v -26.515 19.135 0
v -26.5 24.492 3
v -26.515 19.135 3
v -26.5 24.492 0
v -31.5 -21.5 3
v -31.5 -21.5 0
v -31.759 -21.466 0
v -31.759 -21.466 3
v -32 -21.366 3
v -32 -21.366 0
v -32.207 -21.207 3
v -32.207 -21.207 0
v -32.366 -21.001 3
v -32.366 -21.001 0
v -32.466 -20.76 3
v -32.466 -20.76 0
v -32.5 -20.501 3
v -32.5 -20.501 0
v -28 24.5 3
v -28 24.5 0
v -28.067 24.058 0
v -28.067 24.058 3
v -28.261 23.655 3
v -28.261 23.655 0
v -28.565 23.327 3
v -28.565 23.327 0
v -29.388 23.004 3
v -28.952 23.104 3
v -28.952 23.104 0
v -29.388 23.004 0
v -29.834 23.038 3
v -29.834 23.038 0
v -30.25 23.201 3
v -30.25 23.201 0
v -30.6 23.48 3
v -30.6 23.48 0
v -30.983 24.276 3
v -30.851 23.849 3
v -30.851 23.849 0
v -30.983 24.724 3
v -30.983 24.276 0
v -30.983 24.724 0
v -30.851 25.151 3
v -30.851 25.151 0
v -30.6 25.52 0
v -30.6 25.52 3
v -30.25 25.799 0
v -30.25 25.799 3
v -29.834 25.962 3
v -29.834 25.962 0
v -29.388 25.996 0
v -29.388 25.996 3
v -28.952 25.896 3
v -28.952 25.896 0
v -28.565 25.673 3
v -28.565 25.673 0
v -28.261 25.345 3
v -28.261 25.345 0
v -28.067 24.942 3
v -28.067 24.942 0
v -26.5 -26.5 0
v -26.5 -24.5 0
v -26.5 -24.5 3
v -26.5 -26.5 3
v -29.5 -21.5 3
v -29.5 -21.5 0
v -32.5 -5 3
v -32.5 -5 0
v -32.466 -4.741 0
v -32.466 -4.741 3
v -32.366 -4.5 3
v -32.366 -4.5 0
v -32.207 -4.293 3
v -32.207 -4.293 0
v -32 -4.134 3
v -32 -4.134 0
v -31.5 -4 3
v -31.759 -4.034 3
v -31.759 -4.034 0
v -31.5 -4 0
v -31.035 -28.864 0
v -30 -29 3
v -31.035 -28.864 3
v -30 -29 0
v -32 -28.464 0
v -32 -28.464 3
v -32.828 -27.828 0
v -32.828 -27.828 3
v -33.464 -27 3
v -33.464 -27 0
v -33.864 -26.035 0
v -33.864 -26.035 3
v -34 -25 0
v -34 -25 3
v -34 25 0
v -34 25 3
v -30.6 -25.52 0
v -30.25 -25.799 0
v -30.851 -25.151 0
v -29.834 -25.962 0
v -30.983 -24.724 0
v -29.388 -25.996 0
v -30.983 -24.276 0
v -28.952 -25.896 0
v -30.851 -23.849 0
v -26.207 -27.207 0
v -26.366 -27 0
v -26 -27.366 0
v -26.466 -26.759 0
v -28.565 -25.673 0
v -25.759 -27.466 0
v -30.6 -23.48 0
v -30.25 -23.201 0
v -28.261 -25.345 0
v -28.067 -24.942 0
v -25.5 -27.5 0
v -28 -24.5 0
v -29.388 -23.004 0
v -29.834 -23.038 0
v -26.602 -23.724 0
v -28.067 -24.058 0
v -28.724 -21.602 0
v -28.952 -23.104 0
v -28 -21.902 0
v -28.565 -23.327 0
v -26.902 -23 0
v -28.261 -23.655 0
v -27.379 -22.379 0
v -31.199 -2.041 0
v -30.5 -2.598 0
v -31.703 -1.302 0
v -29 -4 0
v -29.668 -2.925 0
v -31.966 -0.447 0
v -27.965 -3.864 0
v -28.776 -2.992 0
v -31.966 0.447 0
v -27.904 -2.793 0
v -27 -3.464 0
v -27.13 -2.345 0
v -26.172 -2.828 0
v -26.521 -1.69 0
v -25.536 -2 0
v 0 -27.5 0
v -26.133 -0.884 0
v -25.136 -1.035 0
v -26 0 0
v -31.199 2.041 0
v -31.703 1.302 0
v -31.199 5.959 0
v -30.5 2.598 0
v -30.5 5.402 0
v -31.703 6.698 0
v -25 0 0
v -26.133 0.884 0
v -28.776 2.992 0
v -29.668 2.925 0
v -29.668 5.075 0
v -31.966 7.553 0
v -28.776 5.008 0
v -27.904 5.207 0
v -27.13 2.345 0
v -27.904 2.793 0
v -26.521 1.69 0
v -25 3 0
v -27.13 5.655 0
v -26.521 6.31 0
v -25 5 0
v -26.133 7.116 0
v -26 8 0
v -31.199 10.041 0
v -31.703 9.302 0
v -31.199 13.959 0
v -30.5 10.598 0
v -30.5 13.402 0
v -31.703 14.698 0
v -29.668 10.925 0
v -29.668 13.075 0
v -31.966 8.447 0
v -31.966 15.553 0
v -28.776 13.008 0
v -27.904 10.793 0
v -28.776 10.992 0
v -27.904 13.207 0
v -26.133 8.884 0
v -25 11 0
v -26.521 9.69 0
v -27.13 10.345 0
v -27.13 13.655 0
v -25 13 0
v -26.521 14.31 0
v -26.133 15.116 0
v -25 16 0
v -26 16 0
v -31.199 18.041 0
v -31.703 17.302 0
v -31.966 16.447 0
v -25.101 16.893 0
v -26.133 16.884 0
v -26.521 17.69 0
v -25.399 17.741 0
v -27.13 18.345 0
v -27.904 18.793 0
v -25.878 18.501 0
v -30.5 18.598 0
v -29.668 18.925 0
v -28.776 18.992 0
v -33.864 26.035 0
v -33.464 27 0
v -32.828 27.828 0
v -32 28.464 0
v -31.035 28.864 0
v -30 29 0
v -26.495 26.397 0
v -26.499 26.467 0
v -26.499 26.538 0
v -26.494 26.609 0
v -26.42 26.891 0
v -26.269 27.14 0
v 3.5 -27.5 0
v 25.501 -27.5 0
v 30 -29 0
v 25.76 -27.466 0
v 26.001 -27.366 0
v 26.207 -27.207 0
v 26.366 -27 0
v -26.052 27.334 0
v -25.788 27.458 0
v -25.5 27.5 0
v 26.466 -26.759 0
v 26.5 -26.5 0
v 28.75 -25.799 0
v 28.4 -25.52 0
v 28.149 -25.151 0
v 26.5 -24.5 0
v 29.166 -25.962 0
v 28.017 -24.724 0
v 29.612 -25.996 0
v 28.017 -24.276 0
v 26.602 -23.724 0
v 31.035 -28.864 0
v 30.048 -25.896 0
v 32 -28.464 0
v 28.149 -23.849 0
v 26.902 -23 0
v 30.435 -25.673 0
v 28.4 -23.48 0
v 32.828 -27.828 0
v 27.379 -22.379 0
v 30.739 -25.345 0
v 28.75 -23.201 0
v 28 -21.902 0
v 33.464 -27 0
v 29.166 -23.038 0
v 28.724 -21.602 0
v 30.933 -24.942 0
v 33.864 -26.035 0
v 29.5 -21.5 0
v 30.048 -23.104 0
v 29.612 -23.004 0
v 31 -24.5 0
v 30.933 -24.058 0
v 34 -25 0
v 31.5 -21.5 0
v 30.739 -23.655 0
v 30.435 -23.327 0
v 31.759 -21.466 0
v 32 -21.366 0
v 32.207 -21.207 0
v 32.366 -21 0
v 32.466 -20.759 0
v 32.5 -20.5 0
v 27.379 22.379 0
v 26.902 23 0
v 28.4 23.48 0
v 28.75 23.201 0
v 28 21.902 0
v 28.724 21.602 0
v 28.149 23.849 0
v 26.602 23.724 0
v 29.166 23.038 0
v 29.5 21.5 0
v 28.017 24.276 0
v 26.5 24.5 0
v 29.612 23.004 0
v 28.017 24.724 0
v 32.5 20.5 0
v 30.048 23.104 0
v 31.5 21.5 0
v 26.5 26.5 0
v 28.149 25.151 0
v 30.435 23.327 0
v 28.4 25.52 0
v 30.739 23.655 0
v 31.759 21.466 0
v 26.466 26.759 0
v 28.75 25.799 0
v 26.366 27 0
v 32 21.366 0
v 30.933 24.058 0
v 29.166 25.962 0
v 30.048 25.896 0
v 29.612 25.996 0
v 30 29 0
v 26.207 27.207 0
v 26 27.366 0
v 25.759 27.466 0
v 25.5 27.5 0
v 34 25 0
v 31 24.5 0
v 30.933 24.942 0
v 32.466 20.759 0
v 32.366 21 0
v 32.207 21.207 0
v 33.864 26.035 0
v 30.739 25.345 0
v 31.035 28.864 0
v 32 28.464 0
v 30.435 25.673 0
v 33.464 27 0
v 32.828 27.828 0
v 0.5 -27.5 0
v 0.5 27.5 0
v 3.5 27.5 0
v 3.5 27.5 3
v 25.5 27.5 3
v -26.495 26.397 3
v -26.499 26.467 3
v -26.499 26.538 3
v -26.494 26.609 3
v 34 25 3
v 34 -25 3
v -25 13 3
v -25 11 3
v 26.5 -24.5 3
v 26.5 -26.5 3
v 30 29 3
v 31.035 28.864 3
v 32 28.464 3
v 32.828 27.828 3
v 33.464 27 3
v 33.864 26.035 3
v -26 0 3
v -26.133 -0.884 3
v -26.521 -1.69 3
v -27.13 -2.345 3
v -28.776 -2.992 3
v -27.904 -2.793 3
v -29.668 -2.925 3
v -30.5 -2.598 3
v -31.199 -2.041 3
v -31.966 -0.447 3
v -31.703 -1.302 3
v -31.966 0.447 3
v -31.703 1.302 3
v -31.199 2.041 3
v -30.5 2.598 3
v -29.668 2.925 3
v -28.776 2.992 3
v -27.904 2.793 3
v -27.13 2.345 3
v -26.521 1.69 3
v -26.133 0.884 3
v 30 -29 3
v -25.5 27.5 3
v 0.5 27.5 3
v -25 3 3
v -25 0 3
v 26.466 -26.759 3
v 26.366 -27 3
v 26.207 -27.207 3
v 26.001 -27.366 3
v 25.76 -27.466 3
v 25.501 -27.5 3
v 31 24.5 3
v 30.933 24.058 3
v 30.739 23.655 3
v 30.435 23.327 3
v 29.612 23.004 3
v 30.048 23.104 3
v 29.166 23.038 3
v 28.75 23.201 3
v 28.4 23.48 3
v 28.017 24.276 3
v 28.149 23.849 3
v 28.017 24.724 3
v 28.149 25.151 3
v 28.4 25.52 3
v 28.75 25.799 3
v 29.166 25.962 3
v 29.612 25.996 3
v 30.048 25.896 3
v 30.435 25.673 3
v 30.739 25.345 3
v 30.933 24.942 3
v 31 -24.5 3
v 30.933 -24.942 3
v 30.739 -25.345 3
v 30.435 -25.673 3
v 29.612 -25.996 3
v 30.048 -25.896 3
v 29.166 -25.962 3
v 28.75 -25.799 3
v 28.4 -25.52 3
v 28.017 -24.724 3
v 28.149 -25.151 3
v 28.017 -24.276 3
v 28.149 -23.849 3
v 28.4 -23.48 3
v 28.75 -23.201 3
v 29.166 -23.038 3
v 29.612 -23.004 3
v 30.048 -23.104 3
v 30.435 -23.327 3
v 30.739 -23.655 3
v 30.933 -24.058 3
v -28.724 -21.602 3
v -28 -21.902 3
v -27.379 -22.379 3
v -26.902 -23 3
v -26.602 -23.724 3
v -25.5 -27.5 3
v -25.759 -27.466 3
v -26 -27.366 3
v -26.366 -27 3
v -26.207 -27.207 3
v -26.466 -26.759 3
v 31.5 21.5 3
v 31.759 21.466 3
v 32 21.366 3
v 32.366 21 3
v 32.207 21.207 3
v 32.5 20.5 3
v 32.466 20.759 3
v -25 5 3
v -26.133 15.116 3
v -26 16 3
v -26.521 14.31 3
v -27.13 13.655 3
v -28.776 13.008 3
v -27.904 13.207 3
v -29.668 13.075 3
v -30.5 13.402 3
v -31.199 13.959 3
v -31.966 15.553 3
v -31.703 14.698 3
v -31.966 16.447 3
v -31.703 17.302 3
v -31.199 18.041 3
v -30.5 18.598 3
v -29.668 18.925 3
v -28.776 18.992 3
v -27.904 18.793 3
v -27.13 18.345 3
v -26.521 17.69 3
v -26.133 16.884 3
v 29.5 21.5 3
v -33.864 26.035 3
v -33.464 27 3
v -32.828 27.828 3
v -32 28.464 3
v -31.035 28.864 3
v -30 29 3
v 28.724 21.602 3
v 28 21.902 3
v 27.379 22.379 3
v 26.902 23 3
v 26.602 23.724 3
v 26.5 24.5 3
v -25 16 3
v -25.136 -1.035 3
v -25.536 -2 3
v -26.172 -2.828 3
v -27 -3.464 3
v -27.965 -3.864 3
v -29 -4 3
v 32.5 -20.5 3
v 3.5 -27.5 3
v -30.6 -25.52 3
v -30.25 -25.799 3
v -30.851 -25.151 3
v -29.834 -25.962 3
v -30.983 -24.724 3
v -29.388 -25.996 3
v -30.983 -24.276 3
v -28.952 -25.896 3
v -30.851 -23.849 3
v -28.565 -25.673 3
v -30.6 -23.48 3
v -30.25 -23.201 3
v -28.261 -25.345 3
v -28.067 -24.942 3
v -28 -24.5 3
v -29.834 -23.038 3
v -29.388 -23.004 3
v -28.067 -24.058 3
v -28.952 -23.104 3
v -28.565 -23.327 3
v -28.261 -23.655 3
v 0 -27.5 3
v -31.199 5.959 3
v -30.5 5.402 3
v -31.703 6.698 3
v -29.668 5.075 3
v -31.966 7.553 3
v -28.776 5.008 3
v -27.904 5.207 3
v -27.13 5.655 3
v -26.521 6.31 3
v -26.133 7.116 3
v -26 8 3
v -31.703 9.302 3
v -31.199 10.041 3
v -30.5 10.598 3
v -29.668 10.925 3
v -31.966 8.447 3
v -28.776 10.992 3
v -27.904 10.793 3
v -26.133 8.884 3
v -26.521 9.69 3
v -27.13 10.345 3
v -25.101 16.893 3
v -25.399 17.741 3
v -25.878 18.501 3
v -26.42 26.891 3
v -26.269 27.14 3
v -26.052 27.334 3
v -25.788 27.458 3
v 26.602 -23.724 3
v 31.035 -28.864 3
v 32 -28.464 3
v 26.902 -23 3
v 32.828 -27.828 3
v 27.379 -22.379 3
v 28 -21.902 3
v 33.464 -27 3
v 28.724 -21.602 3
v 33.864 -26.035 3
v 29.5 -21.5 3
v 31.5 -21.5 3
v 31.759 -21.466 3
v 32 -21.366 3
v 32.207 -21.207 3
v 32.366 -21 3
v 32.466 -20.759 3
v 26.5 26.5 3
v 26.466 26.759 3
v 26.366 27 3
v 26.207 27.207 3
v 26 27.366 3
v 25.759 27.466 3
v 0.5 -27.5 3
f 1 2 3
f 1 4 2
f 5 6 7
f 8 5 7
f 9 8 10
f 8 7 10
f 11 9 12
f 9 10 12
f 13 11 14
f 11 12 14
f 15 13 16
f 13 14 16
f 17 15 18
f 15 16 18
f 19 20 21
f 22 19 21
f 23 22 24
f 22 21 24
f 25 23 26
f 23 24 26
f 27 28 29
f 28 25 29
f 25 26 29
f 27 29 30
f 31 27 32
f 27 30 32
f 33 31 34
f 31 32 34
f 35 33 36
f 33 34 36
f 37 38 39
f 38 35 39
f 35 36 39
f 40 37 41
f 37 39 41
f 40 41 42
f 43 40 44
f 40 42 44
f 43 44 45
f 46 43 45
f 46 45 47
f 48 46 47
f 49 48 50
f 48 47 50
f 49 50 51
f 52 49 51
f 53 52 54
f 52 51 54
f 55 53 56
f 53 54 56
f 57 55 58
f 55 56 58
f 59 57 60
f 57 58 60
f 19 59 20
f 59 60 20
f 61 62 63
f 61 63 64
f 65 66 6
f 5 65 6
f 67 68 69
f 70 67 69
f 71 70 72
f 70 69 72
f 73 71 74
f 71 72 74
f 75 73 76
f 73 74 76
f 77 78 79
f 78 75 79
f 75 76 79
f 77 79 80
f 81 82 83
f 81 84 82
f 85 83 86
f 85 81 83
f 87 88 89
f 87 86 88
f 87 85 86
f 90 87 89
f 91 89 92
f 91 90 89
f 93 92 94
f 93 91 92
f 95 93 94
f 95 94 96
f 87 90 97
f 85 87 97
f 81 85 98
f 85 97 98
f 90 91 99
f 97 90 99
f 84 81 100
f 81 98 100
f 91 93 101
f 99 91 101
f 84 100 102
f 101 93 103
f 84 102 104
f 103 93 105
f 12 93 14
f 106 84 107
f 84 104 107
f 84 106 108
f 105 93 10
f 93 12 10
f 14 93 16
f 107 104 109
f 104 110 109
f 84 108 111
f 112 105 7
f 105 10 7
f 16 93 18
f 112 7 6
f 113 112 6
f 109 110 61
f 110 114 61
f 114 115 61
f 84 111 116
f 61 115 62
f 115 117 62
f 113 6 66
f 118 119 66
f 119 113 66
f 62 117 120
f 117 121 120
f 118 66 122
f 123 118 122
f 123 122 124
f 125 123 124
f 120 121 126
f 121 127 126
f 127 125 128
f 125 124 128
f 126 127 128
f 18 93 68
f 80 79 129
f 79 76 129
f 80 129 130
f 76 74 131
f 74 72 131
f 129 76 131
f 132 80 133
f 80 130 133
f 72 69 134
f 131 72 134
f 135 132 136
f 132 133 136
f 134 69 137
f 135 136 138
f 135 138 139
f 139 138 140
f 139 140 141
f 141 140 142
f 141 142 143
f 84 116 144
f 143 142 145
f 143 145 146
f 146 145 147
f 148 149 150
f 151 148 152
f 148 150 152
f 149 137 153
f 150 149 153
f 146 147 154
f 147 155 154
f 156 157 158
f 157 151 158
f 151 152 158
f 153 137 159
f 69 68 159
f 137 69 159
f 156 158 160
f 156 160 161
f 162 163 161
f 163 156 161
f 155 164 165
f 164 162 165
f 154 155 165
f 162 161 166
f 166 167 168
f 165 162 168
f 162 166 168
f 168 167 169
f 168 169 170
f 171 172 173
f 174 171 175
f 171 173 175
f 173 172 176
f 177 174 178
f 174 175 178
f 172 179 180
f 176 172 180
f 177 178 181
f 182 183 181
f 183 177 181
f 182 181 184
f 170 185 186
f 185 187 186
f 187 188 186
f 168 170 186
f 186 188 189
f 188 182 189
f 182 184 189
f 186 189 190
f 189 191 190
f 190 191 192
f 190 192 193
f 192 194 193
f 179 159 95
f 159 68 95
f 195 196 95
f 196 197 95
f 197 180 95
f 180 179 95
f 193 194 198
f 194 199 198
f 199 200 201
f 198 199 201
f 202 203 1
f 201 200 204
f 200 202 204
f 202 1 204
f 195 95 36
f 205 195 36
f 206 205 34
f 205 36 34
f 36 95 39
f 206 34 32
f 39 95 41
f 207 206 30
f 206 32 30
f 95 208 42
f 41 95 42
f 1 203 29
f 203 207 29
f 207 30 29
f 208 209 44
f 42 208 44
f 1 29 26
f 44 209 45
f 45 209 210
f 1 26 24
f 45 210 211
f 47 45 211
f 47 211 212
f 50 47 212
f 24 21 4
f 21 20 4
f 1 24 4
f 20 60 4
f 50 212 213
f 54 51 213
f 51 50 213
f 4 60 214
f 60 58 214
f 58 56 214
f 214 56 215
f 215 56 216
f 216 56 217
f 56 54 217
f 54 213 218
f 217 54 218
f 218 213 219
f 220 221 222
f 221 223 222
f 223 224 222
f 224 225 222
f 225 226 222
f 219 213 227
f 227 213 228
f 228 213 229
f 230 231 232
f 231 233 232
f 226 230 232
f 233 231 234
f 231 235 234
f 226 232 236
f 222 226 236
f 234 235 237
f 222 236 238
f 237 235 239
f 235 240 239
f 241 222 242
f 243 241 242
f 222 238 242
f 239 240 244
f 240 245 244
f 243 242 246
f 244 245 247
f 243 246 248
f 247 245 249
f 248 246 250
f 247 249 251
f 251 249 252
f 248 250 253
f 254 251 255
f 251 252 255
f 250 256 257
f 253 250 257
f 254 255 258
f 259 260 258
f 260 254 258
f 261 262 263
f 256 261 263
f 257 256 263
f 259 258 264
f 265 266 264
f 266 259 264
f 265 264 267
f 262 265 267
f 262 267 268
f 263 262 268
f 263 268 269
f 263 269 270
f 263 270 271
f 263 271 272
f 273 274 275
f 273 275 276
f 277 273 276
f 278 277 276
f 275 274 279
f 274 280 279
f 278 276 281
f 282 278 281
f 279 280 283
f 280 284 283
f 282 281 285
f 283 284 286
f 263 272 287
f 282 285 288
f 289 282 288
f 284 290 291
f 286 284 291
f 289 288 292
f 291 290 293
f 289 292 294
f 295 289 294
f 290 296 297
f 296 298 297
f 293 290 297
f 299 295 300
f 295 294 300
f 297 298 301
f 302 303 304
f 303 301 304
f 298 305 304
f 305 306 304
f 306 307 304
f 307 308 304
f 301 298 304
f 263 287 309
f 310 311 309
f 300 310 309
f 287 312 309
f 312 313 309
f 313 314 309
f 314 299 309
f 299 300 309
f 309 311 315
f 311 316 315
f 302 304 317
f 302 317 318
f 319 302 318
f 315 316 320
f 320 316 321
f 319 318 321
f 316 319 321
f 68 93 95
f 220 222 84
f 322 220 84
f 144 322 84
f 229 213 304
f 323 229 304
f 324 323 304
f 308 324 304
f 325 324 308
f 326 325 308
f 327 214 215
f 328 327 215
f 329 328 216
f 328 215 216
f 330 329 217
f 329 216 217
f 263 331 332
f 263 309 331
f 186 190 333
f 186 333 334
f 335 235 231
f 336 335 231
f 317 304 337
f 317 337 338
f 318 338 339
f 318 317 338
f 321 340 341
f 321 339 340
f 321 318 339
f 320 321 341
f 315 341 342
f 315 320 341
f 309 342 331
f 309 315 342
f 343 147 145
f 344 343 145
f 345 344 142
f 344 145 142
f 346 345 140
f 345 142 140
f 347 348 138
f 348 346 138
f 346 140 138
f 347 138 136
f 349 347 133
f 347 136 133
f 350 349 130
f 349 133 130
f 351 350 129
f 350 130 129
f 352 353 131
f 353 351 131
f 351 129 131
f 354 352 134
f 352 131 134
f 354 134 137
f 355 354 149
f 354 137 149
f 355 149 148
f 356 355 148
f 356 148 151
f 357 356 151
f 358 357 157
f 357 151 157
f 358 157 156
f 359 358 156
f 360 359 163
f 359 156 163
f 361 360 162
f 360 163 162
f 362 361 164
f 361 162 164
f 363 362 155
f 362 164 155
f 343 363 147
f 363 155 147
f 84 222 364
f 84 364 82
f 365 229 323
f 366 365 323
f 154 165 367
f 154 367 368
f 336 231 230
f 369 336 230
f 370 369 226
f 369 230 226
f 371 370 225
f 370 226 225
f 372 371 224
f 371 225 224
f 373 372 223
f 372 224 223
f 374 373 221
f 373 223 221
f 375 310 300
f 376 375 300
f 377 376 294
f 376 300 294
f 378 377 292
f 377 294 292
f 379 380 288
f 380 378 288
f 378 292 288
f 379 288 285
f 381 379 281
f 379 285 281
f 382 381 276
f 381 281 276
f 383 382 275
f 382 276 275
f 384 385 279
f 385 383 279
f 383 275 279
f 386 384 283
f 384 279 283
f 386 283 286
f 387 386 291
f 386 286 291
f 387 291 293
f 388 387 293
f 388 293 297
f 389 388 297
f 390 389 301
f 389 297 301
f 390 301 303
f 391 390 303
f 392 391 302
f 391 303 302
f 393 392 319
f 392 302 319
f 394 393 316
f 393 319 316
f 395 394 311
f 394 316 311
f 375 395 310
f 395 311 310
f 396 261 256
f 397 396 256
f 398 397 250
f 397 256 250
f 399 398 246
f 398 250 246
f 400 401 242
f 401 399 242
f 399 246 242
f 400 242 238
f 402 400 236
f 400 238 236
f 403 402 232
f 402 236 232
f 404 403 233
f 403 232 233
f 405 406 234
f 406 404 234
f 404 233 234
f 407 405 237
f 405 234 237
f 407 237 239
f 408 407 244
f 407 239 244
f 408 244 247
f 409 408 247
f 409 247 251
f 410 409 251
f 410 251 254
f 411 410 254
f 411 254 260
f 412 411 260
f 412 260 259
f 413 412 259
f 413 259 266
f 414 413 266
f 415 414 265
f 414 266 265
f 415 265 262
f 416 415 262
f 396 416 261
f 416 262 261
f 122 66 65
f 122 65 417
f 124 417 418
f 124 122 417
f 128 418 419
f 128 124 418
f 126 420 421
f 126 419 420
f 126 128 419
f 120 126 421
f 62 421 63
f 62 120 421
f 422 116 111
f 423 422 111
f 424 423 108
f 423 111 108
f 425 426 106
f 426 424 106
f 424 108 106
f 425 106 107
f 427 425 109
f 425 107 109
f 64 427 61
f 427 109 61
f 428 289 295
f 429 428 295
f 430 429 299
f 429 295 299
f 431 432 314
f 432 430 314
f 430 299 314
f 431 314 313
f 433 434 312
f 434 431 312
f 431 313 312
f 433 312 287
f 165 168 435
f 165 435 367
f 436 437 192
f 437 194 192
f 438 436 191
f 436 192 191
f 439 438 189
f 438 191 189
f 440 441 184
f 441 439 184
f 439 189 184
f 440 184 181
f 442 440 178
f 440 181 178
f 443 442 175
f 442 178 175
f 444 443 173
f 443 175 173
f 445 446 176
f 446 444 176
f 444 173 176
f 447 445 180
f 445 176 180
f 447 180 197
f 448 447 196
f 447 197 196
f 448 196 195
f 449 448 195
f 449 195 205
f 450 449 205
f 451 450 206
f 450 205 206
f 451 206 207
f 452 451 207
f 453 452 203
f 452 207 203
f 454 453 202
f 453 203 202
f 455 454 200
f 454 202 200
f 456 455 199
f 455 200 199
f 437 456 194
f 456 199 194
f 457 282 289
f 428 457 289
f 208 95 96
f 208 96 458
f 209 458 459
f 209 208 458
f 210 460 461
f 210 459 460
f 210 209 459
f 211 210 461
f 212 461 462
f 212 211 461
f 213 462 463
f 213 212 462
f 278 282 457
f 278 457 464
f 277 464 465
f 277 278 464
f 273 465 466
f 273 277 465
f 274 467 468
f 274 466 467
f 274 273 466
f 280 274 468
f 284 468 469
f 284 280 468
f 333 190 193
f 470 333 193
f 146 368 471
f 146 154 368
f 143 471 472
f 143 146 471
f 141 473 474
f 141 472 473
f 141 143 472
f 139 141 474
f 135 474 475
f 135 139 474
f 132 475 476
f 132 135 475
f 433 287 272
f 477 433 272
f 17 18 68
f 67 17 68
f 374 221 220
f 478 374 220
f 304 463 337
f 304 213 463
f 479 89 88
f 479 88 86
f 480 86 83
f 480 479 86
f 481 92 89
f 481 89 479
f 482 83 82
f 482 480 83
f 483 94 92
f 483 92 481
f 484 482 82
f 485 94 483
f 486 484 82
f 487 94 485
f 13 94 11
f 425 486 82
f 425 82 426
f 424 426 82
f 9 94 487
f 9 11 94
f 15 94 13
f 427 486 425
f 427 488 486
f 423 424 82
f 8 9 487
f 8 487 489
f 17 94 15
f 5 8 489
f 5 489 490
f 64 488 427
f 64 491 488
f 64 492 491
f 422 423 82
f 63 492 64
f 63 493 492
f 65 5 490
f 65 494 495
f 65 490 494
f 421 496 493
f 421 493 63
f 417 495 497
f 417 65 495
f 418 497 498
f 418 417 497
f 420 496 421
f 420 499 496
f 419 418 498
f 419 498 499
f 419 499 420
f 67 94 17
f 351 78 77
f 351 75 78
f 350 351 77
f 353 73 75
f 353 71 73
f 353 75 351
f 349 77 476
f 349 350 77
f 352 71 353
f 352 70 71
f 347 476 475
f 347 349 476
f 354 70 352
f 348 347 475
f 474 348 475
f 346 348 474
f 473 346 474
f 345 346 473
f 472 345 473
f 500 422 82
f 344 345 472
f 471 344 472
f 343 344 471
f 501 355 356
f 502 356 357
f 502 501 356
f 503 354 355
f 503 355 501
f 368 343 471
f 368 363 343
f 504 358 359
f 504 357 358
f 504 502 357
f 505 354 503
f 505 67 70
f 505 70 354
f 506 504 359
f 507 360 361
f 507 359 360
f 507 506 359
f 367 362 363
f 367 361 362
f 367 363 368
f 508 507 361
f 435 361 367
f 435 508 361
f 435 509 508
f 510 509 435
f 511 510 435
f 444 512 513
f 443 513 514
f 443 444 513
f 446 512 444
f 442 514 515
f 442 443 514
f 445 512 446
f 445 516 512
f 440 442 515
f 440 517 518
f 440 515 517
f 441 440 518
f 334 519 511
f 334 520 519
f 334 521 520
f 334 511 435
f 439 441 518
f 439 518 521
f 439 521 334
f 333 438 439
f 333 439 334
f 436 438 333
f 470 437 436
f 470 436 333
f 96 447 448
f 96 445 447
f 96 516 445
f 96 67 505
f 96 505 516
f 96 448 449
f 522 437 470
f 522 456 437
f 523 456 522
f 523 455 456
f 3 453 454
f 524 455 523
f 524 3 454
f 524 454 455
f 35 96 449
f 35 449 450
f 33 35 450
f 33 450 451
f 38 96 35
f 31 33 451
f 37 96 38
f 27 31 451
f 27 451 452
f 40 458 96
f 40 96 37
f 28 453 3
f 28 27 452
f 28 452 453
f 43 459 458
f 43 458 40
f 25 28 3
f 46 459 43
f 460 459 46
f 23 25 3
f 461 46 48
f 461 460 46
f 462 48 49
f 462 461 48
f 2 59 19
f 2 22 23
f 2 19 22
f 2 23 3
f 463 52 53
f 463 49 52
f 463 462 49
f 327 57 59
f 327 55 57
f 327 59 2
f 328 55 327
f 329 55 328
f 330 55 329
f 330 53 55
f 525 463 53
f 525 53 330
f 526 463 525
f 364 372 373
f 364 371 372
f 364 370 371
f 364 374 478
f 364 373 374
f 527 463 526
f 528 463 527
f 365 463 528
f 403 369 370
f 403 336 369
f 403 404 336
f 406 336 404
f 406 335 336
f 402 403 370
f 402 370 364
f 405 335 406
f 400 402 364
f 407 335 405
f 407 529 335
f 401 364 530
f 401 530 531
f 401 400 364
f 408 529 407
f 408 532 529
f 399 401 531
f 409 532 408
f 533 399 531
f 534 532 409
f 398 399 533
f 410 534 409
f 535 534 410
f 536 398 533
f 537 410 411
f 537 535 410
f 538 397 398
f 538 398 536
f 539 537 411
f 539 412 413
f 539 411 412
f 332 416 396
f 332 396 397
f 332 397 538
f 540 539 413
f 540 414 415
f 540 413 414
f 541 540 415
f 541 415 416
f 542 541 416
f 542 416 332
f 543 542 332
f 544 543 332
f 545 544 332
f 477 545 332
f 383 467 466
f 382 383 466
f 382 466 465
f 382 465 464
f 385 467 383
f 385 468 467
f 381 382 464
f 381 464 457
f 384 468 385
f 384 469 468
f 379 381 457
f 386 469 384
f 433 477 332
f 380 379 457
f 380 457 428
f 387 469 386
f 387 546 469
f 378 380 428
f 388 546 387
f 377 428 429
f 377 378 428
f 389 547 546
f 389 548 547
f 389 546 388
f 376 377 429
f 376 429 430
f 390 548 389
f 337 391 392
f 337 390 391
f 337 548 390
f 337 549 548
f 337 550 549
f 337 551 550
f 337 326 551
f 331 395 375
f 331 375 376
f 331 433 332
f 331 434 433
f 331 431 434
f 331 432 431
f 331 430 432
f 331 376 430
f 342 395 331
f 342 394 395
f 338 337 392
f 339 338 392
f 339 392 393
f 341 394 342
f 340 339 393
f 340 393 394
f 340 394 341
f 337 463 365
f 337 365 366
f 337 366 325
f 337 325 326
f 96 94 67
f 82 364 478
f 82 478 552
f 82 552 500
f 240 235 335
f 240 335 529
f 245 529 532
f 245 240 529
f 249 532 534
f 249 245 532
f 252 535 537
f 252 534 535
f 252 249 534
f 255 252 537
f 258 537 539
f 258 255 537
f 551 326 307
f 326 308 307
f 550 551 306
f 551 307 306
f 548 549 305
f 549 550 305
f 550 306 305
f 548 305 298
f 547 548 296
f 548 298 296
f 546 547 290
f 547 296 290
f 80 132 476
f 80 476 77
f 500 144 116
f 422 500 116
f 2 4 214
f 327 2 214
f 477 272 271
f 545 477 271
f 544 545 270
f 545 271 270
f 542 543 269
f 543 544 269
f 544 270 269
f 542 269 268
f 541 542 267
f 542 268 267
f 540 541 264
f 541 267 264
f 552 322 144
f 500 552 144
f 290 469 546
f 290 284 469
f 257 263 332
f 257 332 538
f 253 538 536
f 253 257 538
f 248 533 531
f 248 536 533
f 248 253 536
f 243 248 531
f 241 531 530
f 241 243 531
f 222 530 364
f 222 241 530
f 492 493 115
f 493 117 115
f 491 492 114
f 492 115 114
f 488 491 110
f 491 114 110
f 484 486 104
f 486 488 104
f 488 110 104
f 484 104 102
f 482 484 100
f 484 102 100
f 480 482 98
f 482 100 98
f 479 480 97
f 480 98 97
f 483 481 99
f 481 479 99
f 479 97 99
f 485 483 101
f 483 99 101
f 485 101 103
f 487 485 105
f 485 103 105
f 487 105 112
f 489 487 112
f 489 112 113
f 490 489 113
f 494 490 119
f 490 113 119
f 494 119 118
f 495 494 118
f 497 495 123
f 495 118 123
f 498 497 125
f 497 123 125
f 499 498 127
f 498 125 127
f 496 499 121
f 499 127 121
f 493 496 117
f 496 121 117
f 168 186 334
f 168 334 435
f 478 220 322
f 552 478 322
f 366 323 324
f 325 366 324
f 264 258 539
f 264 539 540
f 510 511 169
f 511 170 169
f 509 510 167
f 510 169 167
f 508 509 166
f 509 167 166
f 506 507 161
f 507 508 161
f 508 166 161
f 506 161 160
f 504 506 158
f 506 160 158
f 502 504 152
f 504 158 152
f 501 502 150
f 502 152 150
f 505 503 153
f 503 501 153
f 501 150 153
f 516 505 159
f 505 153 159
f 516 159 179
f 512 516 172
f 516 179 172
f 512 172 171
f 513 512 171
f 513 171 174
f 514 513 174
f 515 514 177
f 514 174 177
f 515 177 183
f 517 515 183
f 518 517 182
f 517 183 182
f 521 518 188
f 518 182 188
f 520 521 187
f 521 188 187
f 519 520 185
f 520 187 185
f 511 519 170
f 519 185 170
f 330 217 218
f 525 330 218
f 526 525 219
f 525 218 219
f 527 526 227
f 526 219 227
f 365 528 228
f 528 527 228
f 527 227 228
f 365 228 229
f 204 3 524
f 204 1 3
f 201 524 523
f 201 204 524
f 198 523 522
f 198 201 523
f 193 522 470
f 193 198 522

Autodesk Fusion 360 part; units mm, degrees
sketch "Sketch1" plane through (0, 0, 0) normal (0, 0, 1) x (1, 0, 0)
  line L0 (-29.5, 24.5) -> (-35.5, 24.5) construction
  circle A0 centre (29.5, 24.5) radius 1.5
  line L1 (25.5009, -27.5) -> (3.5, -27.5)
  arc A1 (34, 25) -> (30, 29) centre (30, 25) ccw
  circle A2 centre (29.5, -24.5) radius 1.5
  arc A3 (30, -29) -> (34, -25) centre (30, -25) ccw
  line L2 (30, -29) -> (-30, -29)
  arc A4 (-34, -25) -> (-30, -29) centre (-30, -25) ccw
  line L3 (0, -27.5) -> (0.5, -27.5) construction
  line L4 (0.5, -27.5) -> (-25.5, -27.5)
  line L5 (-30, 29) -> (30, 29)
  line L6 (0, 27.5) -> (0.5, 27.5) construction
  circle A5 centre (-29.5, 24.5) radius 1.5
  arc A6 (-30, 29) -> (-34, 25) centre (-30, 25) ccw
  line L7 (0, -27.5) -> (0.5, -27.5) construction
  line L8 (-34, -25) -> (-34, 25)
  circle A7 centre (-29.5, -24.5) radius 1.5
  line L9 (0, -27.5) -> (0.5, -27.5)
  line L10 (34, 25) -> (34, -25)
  line L11 (-29.5, 24.5) -> (-34, 24.5) construction
  line L12 (-34, 24.5) -> (-34, 29) construction
  line L13 (-34, 29) -> (-29.5, 29) construction
  line L14 (-29.5, 29) -> (-29.5, 24.5) construction
  line L15 (-34, 29) -> (-29, 29) construction
  line L16 (-29, 29) -> (-29, 16) construction
  line L17 (-29, 16) -> (-34, 16) construction
  line L18 (-34, 16) -> (-34, 29) construction
  line L19 (-25, 13) -> (-25, 11)
  line L20 (-25, 5) -> (-25, 3)
  line L21 (-25, 13) -> (-25, 16)
  line L22 (-25, 11) -> (-25, 5)
  line L23 (-25, 3) -> (-25, 0)
  line L24 (-26.5, 24.4915) -> (-26.494, 26.6091)
  line L25 (-26.5, 24.4915) -> (-26.5151, 19.1346)
  arc A8 (-25.5, 27.5) -> (-26.4946, 26.3966) centre (-25.5, 26.5) ccw
  line L26 (-30, 27.5) -> (-29, 27.5)
  line L27 (-25.5, 27.5) -> (0.5, 27.5)
  arc A9 (-29, 27.458) -> (-29.5, 27.5) centre (-29.5, 24.5) ccw
  arc A10 (-29, 27.458) -> (-29.5, 27.5) centre (-29.5, 24.5) ccw
  circle A11 centre (-29, 16) radius 3
  circle A12 centre (-29, 8) radius 3
  circle A13 centre (-29, 0) radius 3
  arc A14 (-25, 16) -> (-26.5151, 19.1346) centre (-29, 16) ccw
  arc A15 (-29, -4) -> (-25, 0) centre (-29, 0) ccw
  line L28 (-32.5, -20.5009) -> (-32.5, -4.999)
  line L29 (-29, -3) -> (-29, -4) construction
  line L30 (-29, -4) -> (-31.5, -4)
  line L31 (-29.5, -24.5) -> (-26.5, -24.5) construction
  line L32 (-26.5, -24.5) -> (-26.5, -21.5) construction
  line L33 (-26.5, -21.5) -> (-29.5, -21.5) construction
  line L34 (-29.5, -21.5) -> (-29.5, -24.5) construction
  line L35 (-26.5, -24.5) -> (-26.5, -26.5)
  line L36 (-29.5, -21.5) -> (-31.5, -21.5)
  arc A16 (-26.5, -24.5015) -> (-29.5014, -21.5) centre (-29.5, -24.5) ccw
  arc A17 (-31.5, -4) -> (-32.5, -5.001) centre (-31.5, -5) ccw
  arc A18 (-32.5, -20.4991) -> (-31.5, -21.5) centre (-31.5, -20.5) ccw
  arc A19 (-26.5, -26.5) -> (-25.5, -27.5) centre (-25.5, -26.5) ccw
  line L37 (0.5, 27.5) -> (3.5, 27.5)
  line L38 (3.5, -27.5) -> (0.5, -27.5)
  line L39 (29.5, -24.5) -> (26.5, -24.5) construction
  line L40 (26.5, -24.5) -> (26.5, -21.5) construction
  line L41 (26.5, -21.5) -> (29.5, -21.5) construction
  line L42 (29.5, -21.5) -> (29.5, -24.5) construction
  line L43 (29.5, -21.5) -> (31.5, -21.5)
  line L44 (26.5, -24.5) -> (26.5, -26.5)
  line L45 (32.5, -24.5) -> (32.5, -25)
  arc A20 (29.5014, -21.5) -> (26.5, -24.5015) centre (29.5, -24.5) ccw
  arc A21 (25.4991, -27.5) -> (26.5, -26.5) centre (25.5, -26.5) ccw
  arc A22 (31.5, -21.5) -> (32.5, -20.5) centre (31.5, -20.5) ccw
  line L46 (29.5, 24.5) -> (26.5, 24.5) construction
  line L47 (26.5, 24.5) -> (26.5, 21.5) construction
  line L48 (26.5, 21.5) -> (29.5, 21.5) construction
  line L49 (29.5, 21.5) -> (29.5, 24.5) construction
  line L50 (26.5, 24.5) -> (26.5, 26.5)
  line L51 (29.5, 21.5) -> (31.5, 21.5)
  line L52 (32.5, 25) -> (32.5, 24.5)
  line L53 (32.5, 20.501) -> (32.5, -20.5)
  arc A23 (26.5, 24.5015) -> (29.5014, 21.5) centre (29.5, 24.5) ccw
  line L54 (3.5, 27.5) -> (25.5, 27.5)
  line L55 (29.5, 27.5) -> (30, 27.5)
  arc A24 (26.5, 26.5) -> (25.5, 27.5) centre (25.5, 26.5) ccw
  arc A25 (32.5, 20.499) -> (31.5, 21.5) centre (31.5, 20.5) ccw
  point P0 (-29, 12)
  dimension "d1" = 3
  dimension "d2" = 3
  dimension "d3" = 3
  dimension "d4" = 3
  dimension "d12" = 5
  dimension "d13" = 13
  dimension "d20" = 2
extrude "Extrude1" add sketch "Sketch1" along normal blind 3
equation "gasket_thikness = 3 mm"
equation "d21 = gasket_thikness"
